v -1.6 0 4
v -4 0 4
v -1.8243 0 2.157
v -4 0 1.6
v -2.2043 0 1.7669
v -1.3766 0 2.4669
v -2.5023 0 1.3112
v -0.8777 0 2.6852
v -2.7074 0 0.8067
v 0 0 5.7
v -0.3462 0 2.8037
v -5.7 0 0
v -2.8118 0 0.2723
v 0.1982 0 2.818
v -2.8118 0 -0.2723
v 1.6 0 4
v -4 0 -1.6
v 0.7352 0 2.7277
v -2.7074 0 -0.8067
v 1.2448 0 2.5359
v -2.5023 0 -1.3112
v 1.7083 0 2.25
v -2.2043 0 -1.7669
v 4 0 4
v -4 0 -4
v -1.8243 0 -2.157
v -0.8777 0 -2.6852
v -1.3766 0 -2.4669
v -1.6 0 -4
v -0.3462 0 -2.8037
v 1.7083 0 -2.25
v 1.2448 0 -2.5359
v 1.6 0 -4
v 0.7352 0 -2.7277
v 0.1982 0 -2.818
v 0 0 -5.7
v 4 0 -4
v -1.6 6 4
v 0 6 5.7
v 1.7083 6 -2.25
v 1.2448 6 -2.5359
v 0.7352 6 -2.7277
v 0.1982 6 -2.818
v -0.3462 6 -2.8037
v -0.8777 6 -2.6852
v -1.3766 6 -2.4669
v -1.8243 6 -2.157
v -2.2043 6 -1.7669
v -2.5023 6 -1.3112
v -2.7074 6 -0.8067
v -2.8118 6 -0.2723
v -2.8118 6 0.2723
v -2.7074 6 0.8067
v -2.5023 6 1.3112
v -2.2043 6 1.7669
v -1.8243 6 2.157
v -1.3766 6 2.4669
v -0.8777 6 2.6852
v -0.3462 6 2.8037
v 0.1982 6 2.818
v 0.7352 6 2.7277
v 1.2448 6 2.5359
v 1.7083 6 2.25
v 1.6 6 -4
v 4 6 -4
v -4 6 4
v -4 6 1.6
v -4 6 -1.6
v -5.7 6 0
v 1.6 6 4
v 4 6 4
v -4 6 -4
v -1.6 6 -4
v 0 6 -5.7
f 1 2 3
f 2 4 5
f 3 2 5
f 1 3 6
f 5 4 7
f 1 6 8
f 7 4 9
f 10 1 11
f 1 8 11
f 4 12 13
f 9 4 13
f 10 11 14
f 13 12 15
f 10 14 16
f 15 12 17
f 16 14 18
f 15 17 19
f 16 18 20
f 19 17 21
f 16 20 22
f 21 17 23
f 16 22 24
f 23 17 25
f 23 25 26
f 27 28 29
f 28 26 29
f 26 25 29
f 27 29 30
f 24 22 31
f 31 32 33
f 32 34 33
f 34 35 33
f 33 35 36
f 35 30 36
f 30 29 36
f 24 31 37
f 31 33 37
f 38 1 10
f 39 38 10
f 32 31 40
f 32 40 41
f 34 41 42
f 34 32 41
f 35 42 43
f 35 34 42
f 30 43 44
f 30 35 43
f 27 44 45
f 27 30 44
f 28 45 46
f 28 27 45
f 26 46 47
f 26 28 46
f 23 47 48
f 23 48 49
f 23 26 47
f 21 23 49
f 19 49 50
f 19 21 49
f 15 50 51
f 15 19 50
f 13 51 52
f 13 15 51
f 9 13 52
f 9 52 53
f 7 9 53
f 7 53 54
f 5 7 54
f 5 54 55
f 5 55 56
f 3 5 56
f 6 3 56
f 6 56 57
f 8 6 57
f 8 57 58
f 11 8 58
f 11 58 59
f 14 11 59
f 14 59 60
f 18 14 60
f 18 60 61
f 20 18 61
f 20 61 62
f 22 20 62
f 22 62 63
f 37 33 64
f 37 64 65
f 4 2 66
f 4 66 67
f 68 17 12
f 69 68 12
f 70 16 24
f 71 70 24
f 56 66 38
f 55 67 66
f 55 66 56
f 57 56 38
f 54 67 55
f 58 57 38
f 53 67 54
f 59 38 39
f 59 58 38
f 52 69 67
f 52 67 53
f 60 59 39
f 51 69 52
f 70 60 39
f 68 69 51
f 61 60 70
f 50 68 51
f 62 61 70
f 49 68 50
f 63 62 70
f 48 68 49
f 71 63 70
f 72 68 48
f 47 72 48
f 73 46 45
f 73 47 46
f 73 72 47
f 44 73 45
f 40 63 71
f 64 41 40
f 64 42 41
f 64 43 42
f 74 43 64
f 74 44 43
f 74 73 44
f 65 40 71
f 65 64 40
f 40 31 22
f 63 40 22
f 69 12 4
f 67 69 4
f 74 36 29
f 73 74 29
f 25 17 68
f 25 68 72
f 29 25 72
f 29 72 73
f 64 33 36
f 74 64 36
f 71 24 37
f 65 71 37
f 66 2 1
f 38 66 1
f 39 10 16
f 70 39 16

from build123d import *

# Parameters (mm, degrees)
ESQUISSE1_W        = 8
ESQUISSE1_H        = 8
ESQUISSE1_R        = 2.825
BOSS_EXTRU_1_DEPTH = 6


with BuildPart() as part:
    # Esquisse1 → Boss.-Extru.1 (new body)
    # profile 1 of 6: a face of its own
    with BuildSketch(Plane(origin=(0, 0, 0), x_dir=(1, 0, 0), z_dir=(0, 1, 0))):
        Rectangle(ESQUISSE1_W, ESQUISSE1_H)
        Circle(ESQUISSE1_R, mode=Mode.SUBTRACT)
    # profile 2 of 6: a face of its own
    with BuildSketch(Plane(origin=(0, 0, 0), x_dir=(1, 0, 0), z_dir=(0, 1, 0))):
        Polygon((1.6, -4), (-1.6, -4), (0, -5.7), align=None)
    # profile 3 of 6: a face of its own
    with BuildSketch(Plane(origin=(0, 0, 0), x_dir=(1, 0, 0), z_dir=(0, 1, 0))):
        Polygon((-1.6, 4), (-4, 4), (-4, 1.6), (-4, -1.6), (-4, -4), (-1.6, -4), (1.6, -4), (4, -4), (4, 4), (1.6, 4), align=None)
        with BuildLine():
            ThreePointArc((1.708252031, -2.25), (-2.825, 0), (1.708252031, 2.25))
            ThreePointArc((1.708252031, 2.25), (2.530458159, 1.255948449), (2.825, 0))
            ThreePointArc((2.825, 0), (2.530458159, -1.255948449), (1.708252031, -2.25))
        make_face(mode=Mode.SUBTRACT)
    # profile 4 of 6: a face of its own
    with BuildSketch(Plane(origin=(0, 0, 0), x_dir=(1, 0, 0), z_dir=(0, 1, 0))):
        with BuildLine():
            ThreePointArc((2.825, 0), (2.530458159, 1.255948449), (1.708252031, 2.25))
            Line((1.708252031, 2.25), (1.708252031, -2.25))
            ThreePointArc((1.708252031, -2.25), (2.530458159, -1.255948449), (2.825, 0))
        make_face()
    # profile 5 of 6: a face of its own
    with BuildSketch(Plane(origin=(0, 0, 0), x_dir=(1, 0, 0), z_dir=(0, 1, 0))):
        Polygon((-4, -1.6), (-4, 1.6), (-5.7, 0), align=None)
    # profile 6 of 6: a face of its own
    with BuildSketch(Plane(origin=(0, 0, 0), x_dir=(1, 0, 0), z_dir=(0, 1, 0))):
        Polygon((0, 5.7), (-1.6, 4), (1.6, 4), align=None)
    extrude(amount=BOSS_EXTRU_1_DEPTH)


solid = part.part
